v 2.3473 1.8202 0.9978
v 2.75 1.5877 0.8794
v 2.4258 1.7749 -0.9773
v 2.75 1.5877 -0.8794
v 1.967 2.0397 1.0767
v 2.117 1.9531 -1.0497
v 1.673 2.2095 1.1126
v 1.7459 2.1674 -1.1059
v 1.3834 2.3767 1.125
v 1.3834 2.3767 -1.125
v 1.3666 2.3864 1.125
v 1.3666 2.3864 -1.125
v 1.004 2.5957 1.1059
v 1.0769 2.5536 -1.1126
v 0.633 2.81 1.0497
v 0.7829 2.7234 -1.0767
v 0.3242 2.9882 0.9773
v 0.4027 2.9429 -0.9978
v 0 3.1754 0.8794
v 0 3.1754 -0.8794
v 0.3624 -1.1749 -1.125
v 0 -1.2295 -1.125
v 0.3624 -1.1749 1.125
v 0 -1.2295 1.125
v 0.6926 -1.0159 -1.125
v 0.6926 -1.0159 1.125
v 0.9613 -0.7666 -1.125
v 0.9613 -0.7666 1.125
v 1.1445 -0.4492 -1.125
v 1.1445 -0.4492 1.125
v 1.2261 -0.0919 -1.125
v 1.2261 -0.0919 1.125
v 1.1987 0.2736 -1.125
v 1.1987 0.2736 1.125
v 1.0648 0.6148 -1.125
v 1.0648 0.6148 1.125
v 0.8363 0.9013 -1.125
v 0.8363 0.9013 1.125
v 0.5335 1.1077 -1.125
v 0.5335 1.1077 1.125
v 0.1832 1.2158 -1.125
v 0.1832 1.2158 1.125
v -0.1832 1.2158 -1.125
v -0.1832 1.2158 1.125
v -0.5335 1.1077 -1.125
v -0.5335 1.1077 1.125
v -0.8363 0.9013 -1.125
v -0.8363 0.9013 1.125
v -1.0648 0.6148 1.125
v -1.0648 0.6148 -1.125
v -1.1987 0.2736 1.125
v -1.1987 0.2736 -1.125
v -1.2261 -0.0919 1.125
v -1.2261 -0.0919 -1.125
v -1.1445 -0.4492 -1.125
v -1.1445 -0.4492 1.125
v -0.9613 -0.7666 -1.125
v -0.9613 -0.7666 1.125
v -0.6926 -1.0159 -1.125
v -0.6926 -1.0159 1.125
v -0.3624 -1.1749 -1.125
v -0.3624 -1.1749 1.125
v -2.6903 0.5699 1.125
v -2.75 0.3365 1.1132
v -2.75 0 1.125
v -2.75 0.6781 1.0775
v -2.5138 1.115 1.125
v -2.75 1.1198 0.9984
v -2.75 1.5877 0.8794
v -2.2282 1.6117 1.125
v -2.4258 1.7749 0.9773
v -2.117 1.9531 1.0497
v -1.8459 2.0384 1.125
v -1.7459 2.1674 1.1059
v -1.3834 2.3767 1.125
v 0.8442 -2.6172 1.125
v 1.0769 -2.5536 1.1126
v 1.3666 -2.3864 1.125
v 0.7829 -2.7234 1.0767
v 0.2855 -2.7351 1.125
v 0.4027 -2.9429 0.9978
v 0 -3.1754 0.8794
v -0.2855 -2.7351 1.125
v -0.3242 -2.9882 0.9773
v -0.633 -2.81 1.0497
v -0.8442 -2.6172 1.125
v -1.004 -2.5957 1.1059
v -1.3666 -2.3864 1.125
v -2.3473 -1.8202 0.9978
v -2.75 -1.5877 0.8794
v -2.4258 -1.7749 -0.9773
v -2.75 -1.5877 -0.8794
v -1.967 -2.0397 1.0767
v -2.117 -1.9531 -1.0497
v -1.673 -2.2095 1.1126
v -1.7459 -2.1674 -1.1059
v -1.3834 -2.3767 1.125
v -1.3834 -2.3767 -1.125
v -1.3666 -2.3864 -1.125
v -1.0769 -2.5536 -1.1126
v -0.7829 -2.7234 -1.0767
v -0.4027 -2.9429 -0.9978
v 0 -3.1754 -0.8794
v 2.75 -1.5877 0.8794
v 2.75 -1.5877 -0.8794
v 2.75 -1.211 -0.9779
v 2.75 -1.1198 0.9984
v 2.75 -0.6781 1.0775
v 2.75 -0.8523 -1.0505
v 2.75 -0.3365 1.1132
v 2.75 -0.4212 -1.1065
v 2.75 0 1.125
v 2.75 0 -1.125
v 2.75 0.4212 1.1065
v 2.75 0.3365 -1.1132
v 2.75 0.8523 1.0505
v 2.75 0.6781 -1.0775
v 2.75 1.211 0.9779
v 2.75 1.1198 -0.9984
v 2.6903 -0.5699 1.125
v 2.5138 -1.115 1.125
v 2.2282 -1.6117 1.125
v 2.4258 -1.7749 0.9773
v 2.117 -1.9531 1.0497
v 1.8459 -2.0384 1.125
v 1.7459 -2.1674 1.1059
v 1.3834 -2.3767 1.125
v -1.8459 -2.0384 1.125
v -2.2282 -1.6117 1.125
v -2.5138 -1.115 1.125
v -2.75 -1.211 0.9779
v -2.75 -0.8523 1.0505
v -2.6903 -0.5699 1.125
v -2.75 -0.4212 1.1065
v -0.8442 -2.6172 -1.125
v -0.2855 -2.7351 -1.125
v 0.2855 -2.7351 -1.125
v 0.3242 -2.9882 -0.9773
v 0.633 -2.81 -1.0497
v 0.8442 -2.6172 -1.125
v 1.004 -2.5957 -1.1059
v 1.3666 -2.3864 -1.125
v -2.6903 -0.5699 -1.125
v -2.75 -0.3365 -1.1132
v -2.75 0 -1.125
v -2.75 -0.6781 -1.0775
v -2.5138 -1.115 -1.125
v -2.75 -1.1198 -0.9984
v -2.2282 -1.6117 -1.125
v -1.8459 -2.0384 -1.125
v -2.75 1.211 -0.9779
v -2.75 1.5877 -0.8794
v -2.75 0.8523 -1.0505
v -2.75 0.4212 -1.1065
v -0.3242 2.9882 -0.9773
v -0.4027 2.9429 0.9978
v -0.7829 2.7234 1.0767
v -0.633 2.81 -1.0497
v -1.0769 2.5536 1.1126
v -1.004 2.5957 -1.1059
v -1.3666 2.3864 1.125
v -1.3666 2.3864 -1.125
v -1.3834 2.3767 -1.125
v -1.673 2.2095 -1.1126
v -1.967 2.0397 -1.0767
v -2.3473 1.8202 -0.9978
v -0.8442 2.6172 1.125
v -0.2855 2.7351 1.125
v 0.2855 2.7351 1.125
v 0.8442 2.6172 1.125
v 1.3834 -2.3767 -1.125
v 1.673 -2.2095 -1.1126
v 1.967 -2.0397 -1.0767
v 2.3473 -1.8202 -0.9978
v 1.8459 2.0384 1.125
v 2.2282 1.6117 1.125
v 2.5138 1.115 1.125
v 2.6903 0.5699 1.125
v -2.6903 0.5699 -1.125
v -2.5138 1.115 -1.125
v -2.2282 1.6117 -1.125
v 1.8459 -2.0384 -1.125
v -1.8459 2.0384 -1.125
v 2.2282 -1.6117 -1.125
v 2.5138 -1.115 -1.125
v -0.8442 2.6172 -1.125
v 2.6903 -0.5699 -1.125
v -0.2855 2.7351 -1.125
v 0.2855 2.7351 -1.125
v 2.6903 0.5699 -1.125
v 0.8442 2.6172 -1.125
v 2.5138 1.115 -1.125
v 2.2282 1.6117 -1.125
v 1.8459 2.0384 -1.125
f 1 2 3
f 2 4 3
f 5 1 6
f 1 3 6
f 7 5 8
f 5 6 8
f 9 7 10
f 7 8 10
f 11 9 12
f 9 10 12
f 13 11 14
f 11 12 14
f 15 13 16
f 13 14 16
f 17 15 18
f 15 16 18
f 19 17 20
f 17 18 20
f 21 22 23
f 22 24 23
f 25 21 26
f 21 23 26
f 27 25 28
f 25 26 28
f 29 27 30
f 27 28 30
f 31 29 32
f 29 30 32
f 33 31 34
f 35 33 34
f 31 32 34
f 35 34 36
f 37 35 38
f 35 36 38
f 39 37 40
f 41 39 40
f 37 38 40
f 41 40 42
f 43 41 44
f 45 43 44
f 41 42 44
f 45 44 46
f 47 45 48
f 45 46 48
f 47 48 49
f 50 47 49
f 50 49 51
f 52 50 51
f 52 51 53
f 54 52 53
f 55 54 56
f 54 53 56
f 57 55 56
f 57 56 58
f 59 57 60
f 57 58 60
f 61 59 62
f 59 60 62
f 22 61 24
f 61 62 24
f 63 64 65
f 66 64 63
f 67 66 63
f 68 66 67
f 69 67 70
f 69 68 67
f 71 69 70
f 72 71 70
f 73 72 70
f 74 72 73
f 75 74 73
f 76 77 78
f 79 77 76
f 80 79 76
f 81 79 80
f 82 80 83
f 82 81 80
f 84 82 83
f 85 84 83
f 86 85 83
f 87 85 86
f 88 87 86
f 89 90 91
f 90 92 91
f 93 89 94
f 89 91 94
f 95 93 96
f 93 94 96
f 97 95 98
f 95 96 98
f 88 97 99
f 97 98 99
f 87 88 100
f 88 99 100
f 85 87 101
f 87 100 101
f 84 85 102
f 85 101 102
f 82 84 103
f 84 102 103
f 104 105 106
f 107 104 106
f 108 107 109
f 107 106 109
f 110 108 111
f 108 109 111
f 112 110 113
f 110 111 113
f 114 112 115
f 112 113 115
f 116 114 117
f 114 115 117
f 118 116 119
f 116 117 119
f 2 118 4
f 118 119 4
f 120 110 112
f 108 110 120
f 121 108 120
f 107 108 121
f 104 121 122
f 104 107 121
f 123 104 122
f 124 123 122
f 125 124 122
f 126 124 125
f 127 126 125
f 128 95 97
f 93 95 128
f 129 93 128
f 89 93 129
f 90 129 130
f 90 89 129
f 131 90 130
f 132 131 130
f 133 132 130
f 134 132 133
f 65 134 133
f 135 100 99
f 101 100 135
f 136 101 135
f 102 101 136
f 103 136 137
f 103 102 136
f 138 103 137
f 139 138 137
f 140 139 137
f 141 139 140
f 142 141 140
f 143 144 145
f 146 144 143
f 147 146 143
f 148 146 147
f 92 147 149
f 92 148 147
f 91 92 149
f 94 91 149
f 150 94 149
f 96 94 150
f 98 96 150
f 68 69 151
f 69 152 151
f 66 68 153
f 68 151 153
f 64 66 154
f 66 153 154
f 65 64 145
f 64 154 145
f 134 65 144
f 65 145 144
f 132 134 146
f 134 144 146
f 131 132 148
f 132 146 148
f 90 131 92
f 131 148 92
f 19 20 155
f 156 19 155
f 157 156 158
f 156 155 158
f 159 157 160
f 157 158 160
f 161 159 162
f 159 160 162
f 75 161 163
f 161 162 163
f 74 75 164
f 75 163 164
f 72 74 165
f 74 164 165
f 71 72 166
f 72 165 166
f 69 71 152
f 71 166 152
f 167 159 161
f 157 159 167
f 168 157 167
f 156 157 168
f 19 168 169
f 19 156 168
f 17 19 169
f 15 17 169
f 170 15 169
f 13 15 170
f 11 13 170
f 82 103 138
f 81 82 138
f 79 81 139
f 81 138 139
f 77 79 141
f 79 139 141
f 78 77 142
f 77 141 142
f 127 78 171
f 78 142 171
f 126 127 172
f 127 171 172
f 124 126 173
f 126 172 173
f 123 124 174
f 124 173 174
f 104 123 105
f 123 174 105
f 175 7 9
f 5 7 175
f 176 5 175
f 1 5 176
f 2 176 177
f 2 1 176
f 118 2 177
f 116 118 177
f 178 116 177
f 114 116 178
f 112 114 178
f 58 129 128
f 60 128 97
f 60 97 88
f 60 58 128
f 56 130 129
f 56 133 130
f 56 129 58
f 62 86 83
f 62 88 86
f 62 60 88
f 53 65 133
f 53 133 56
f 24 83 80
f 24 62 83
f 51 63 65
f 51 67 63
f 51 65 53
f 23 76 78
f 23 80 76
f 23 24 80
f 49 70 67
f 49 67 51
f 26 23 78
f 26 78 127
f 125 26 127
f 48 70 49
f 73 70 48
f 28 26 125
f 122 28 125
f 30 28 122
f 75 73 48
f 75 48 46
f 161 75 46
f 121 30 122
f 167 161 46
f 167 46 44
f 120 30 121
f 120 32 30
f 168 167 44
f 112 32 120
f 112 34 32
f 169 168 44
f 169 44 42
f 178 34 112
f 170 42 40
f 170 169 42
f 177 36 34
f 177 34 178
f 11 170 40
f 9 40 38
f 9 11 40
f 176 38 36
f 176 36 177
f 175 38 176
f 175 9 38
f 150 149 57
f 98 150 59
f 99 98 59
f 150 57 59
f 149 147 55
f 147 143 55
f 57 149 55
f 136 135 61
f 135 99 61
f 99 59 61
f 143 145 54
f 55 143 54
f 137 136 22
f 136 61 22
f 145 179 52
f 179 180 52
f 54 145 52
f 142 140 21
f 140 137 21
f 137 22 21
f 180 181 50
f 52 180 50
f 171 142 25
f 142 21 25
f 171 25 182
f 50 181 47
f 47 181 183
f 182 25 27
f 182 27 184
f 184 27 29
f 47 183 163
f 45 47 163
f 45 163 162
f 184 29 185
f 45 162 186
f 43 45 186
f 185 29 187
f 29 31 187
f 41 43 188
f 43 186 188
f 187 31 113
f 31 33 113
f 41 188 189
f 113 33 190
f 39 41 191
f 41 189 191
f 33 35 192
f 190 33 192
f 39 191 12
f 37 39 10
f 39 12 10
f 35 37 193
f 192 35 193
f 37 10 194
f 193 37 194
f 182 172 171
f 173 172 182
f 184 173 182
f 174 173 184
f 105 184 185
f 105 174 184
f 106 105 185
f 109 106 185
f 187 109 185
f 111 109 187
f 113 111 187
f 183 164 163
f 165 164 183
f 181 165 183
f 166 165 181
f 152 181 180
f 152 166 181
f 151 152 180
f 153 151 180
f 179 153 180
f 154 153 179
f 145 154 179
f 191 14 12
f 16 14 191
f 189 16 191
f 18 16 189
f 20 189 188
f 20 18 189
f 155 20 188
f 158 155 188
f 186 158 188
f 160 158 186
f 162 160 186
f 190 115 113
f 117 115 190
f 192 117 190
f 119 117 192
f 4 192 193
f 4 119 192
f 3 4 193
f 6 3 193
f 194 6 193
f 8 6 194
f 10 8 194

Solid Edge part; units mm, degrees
sketch "Sketch1" plane through (0, 0, 0) normal (0, 0, 1) x (1, 0, 0)
  line L0 (2.75, 1.5877) -> (0, 3.1754)
  line L1 (0, 3.1754) -> (-2.75, 1.5877)
  line L2 (-2.75, 1.5877) -> (-2.75, -1.5877)
  line L3 (-2.75, -1.5877) -> (0, -3.1754)
  line L4 (0, -3.1754) -> (2.75, -1.5877)
  line L5 (2.75, -1.5877) -> (2.75, 1.5877)
  dimension "D1" = 5.5
extrude "Protrusion1" add sketch "Sketch1" along normal mid plane 2.25
hole "Agujero_1" at (0, 0, 1.125) direction (0, 0, -1) diameter 2.459 end up to next
sketch "Sketch2" plane through (0, 0, 0) normal (0, -1, 0) x (1, 0, 0)
  line L0 (2.75, 1.125) -> (4.6986, 0)
revolve "RevolvedCutout1" cut sketch "Sketch2" angle 360 about axis through (0, 0, 54) along (0, 0, -1) material side at (3.7493, 0, 0.6058)
mirror "Mirror1" about plane through (0, 0, 0) normal (0, 0, 1) of "RevolvedCutout1"
